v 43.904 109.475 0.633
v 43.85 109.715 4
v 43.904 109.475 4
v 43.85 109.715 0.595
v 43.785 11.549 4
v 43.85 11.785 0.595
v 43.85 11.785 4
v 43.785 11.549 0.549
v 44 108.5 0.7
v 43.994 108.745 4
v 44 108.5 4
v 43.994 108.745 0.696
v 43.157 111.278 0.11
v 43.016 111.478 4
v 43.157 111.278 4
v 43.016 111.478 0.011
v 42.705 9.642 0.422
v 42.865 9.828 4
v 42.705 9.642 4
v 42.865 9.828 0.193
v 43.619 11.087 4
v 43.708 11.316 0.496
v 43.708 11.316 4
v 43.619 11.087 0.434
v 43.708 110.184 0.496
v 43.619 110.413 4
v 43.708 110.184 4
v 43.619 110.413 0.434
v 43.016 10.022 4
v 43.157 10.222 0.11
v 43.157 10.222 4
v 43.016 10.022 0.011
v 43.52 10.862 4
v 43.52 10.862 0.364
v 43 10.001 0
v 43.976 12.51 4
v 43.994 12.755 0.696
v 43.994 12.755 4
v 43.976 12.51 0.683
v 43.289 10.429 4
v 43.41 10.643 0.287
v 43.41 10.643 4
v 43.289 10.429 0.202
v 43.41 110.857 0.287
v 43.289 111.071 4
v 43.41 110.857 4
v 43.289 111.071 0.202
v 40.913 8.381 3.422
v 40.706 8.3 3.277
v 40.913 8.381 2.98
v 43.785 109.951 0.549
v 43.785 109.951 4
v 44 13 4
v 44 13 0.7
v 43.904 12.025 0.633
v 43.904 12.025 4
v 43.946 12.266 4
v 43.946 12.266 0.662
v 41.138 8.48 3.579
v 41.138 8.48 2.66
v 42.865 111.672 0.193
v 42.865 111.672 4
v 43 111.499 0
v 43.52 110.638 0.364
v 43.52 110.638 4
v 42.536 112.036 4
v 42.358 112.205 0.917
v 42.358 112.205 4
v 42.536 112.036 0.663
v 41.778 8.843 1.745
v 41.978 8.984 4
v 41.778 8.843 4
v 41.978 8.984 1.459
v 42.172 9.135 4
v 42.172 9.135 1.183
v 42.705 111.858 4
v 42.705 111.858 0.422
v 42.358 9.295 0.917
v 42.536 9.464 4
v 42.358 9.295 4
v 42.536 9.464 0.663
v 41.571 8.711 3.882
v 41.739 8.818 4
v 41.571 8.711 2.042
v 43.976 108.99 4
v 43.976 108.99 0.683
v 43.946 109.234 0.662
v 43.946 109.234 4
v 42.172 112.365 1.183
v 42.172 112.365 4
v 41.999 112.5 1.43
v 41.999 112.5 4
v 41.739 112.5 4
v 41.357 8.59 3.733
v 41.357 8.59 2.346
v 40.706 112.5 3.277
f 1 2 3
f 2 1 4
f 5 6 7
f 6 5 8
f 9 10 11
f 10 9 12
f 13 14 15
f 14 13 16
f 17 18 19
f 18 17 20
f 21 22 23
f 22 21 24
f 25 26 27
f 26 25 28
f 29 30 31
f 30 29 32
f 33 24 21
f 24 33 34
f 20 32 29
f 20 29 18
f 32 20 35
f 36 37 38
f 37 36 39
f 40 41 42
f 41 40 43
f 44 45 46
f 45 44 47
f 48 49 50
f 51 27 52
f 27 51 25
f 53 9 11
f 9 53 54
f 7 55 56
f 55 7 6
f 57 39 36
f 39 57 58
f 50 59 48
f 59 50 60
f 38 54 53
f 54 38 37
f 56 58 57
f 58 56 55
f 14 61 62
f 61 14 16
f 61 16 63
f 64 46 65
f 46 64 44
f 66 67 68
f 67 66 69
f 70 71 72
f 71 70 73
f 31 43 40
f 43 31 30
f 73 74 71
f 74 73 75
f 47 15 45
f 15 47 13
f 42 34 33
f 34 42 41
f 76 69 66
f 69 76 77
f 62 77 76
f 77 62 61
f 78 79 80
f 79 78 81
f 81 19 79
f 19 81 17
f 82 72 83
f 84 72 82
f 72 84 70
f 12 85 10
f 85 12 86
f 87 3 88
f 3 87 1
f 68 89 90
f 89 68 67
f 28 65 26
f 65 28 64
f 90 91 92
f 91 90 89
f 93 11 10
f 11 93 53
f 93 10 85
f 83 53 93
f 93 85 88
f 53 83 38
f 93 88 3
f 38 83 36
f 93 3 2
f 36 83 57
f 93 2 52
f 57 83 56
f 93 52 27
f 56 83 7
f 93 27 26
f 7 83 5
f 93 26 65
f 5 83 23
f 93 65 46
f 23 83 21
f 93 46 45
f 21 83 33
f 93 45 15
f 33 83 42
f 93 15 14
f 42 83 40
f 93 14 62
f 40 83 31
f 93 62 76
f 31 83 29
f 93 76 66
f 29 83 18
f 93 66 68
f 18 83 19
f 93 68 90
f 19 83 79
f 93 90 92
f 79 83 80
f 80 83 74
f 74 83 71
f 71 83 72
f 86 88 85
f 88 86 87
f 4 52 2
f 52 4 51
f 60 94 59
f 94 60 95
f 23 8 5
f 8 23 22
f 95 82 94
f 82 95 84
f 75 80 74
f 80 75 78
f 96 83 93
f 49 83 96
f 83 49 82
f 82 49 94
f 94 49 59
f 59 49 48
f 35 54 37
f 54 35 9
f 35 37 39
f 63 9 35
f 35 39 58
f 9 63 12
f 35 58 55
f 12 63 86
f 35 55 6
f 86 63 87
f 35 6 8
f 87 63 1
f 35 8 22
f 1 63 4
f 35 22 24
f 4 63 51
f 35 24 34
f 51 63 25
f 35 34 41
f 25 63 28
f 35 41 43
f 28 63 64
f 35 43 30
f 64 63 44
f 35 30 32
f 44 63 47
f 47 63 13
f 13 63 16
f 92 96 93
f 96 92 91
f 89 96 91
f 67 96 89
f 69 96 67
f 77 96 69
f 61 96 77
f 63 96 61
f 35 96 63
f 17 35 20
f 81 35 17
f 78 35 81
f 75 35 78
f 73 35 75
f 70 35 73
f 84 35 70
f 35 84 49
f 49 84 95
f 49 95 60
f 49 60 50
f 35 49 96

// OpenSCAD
// file: audio_interface.scad
module audio_interface(depth, width, height, corner_radius) {
    translate([0,depth,0])
    rotate([90,0,0])
    hull() {
        translate([corner_radius,corner_radius,0]) 
        cylinder(h=depth,r=corner_radius);
        
        translate([width-corner_radius,corner_radius,0]) 
        cylinder(h=depth,r=corner_radius);
        
        translate([corner_radius,height-corner_radius,0]) 
        cylinder(h=depth,r=corner_radius);
        
        translate([width-corner_radius,height-corner_radius,0]) 
        cylinder(h=depth,r=corner_radius);
    }
}
// main file
include <audio_interface.scad>

$fn=128;



depth = 113.5;
width = 43;
height = 165;
thickness = 4;
lip=3;
corner_r=8;


intersection(){
translate([thickness+lip, depth, 0])
rotate([90,0,0])
audio_interface(thickness, width-lip*2, depth-thickness*2, 5);

translate([width,thickness+lip,0])
rotate([0,-35,0])
cube([width-lip*2,depth-thickness*2,thickness]);
}
